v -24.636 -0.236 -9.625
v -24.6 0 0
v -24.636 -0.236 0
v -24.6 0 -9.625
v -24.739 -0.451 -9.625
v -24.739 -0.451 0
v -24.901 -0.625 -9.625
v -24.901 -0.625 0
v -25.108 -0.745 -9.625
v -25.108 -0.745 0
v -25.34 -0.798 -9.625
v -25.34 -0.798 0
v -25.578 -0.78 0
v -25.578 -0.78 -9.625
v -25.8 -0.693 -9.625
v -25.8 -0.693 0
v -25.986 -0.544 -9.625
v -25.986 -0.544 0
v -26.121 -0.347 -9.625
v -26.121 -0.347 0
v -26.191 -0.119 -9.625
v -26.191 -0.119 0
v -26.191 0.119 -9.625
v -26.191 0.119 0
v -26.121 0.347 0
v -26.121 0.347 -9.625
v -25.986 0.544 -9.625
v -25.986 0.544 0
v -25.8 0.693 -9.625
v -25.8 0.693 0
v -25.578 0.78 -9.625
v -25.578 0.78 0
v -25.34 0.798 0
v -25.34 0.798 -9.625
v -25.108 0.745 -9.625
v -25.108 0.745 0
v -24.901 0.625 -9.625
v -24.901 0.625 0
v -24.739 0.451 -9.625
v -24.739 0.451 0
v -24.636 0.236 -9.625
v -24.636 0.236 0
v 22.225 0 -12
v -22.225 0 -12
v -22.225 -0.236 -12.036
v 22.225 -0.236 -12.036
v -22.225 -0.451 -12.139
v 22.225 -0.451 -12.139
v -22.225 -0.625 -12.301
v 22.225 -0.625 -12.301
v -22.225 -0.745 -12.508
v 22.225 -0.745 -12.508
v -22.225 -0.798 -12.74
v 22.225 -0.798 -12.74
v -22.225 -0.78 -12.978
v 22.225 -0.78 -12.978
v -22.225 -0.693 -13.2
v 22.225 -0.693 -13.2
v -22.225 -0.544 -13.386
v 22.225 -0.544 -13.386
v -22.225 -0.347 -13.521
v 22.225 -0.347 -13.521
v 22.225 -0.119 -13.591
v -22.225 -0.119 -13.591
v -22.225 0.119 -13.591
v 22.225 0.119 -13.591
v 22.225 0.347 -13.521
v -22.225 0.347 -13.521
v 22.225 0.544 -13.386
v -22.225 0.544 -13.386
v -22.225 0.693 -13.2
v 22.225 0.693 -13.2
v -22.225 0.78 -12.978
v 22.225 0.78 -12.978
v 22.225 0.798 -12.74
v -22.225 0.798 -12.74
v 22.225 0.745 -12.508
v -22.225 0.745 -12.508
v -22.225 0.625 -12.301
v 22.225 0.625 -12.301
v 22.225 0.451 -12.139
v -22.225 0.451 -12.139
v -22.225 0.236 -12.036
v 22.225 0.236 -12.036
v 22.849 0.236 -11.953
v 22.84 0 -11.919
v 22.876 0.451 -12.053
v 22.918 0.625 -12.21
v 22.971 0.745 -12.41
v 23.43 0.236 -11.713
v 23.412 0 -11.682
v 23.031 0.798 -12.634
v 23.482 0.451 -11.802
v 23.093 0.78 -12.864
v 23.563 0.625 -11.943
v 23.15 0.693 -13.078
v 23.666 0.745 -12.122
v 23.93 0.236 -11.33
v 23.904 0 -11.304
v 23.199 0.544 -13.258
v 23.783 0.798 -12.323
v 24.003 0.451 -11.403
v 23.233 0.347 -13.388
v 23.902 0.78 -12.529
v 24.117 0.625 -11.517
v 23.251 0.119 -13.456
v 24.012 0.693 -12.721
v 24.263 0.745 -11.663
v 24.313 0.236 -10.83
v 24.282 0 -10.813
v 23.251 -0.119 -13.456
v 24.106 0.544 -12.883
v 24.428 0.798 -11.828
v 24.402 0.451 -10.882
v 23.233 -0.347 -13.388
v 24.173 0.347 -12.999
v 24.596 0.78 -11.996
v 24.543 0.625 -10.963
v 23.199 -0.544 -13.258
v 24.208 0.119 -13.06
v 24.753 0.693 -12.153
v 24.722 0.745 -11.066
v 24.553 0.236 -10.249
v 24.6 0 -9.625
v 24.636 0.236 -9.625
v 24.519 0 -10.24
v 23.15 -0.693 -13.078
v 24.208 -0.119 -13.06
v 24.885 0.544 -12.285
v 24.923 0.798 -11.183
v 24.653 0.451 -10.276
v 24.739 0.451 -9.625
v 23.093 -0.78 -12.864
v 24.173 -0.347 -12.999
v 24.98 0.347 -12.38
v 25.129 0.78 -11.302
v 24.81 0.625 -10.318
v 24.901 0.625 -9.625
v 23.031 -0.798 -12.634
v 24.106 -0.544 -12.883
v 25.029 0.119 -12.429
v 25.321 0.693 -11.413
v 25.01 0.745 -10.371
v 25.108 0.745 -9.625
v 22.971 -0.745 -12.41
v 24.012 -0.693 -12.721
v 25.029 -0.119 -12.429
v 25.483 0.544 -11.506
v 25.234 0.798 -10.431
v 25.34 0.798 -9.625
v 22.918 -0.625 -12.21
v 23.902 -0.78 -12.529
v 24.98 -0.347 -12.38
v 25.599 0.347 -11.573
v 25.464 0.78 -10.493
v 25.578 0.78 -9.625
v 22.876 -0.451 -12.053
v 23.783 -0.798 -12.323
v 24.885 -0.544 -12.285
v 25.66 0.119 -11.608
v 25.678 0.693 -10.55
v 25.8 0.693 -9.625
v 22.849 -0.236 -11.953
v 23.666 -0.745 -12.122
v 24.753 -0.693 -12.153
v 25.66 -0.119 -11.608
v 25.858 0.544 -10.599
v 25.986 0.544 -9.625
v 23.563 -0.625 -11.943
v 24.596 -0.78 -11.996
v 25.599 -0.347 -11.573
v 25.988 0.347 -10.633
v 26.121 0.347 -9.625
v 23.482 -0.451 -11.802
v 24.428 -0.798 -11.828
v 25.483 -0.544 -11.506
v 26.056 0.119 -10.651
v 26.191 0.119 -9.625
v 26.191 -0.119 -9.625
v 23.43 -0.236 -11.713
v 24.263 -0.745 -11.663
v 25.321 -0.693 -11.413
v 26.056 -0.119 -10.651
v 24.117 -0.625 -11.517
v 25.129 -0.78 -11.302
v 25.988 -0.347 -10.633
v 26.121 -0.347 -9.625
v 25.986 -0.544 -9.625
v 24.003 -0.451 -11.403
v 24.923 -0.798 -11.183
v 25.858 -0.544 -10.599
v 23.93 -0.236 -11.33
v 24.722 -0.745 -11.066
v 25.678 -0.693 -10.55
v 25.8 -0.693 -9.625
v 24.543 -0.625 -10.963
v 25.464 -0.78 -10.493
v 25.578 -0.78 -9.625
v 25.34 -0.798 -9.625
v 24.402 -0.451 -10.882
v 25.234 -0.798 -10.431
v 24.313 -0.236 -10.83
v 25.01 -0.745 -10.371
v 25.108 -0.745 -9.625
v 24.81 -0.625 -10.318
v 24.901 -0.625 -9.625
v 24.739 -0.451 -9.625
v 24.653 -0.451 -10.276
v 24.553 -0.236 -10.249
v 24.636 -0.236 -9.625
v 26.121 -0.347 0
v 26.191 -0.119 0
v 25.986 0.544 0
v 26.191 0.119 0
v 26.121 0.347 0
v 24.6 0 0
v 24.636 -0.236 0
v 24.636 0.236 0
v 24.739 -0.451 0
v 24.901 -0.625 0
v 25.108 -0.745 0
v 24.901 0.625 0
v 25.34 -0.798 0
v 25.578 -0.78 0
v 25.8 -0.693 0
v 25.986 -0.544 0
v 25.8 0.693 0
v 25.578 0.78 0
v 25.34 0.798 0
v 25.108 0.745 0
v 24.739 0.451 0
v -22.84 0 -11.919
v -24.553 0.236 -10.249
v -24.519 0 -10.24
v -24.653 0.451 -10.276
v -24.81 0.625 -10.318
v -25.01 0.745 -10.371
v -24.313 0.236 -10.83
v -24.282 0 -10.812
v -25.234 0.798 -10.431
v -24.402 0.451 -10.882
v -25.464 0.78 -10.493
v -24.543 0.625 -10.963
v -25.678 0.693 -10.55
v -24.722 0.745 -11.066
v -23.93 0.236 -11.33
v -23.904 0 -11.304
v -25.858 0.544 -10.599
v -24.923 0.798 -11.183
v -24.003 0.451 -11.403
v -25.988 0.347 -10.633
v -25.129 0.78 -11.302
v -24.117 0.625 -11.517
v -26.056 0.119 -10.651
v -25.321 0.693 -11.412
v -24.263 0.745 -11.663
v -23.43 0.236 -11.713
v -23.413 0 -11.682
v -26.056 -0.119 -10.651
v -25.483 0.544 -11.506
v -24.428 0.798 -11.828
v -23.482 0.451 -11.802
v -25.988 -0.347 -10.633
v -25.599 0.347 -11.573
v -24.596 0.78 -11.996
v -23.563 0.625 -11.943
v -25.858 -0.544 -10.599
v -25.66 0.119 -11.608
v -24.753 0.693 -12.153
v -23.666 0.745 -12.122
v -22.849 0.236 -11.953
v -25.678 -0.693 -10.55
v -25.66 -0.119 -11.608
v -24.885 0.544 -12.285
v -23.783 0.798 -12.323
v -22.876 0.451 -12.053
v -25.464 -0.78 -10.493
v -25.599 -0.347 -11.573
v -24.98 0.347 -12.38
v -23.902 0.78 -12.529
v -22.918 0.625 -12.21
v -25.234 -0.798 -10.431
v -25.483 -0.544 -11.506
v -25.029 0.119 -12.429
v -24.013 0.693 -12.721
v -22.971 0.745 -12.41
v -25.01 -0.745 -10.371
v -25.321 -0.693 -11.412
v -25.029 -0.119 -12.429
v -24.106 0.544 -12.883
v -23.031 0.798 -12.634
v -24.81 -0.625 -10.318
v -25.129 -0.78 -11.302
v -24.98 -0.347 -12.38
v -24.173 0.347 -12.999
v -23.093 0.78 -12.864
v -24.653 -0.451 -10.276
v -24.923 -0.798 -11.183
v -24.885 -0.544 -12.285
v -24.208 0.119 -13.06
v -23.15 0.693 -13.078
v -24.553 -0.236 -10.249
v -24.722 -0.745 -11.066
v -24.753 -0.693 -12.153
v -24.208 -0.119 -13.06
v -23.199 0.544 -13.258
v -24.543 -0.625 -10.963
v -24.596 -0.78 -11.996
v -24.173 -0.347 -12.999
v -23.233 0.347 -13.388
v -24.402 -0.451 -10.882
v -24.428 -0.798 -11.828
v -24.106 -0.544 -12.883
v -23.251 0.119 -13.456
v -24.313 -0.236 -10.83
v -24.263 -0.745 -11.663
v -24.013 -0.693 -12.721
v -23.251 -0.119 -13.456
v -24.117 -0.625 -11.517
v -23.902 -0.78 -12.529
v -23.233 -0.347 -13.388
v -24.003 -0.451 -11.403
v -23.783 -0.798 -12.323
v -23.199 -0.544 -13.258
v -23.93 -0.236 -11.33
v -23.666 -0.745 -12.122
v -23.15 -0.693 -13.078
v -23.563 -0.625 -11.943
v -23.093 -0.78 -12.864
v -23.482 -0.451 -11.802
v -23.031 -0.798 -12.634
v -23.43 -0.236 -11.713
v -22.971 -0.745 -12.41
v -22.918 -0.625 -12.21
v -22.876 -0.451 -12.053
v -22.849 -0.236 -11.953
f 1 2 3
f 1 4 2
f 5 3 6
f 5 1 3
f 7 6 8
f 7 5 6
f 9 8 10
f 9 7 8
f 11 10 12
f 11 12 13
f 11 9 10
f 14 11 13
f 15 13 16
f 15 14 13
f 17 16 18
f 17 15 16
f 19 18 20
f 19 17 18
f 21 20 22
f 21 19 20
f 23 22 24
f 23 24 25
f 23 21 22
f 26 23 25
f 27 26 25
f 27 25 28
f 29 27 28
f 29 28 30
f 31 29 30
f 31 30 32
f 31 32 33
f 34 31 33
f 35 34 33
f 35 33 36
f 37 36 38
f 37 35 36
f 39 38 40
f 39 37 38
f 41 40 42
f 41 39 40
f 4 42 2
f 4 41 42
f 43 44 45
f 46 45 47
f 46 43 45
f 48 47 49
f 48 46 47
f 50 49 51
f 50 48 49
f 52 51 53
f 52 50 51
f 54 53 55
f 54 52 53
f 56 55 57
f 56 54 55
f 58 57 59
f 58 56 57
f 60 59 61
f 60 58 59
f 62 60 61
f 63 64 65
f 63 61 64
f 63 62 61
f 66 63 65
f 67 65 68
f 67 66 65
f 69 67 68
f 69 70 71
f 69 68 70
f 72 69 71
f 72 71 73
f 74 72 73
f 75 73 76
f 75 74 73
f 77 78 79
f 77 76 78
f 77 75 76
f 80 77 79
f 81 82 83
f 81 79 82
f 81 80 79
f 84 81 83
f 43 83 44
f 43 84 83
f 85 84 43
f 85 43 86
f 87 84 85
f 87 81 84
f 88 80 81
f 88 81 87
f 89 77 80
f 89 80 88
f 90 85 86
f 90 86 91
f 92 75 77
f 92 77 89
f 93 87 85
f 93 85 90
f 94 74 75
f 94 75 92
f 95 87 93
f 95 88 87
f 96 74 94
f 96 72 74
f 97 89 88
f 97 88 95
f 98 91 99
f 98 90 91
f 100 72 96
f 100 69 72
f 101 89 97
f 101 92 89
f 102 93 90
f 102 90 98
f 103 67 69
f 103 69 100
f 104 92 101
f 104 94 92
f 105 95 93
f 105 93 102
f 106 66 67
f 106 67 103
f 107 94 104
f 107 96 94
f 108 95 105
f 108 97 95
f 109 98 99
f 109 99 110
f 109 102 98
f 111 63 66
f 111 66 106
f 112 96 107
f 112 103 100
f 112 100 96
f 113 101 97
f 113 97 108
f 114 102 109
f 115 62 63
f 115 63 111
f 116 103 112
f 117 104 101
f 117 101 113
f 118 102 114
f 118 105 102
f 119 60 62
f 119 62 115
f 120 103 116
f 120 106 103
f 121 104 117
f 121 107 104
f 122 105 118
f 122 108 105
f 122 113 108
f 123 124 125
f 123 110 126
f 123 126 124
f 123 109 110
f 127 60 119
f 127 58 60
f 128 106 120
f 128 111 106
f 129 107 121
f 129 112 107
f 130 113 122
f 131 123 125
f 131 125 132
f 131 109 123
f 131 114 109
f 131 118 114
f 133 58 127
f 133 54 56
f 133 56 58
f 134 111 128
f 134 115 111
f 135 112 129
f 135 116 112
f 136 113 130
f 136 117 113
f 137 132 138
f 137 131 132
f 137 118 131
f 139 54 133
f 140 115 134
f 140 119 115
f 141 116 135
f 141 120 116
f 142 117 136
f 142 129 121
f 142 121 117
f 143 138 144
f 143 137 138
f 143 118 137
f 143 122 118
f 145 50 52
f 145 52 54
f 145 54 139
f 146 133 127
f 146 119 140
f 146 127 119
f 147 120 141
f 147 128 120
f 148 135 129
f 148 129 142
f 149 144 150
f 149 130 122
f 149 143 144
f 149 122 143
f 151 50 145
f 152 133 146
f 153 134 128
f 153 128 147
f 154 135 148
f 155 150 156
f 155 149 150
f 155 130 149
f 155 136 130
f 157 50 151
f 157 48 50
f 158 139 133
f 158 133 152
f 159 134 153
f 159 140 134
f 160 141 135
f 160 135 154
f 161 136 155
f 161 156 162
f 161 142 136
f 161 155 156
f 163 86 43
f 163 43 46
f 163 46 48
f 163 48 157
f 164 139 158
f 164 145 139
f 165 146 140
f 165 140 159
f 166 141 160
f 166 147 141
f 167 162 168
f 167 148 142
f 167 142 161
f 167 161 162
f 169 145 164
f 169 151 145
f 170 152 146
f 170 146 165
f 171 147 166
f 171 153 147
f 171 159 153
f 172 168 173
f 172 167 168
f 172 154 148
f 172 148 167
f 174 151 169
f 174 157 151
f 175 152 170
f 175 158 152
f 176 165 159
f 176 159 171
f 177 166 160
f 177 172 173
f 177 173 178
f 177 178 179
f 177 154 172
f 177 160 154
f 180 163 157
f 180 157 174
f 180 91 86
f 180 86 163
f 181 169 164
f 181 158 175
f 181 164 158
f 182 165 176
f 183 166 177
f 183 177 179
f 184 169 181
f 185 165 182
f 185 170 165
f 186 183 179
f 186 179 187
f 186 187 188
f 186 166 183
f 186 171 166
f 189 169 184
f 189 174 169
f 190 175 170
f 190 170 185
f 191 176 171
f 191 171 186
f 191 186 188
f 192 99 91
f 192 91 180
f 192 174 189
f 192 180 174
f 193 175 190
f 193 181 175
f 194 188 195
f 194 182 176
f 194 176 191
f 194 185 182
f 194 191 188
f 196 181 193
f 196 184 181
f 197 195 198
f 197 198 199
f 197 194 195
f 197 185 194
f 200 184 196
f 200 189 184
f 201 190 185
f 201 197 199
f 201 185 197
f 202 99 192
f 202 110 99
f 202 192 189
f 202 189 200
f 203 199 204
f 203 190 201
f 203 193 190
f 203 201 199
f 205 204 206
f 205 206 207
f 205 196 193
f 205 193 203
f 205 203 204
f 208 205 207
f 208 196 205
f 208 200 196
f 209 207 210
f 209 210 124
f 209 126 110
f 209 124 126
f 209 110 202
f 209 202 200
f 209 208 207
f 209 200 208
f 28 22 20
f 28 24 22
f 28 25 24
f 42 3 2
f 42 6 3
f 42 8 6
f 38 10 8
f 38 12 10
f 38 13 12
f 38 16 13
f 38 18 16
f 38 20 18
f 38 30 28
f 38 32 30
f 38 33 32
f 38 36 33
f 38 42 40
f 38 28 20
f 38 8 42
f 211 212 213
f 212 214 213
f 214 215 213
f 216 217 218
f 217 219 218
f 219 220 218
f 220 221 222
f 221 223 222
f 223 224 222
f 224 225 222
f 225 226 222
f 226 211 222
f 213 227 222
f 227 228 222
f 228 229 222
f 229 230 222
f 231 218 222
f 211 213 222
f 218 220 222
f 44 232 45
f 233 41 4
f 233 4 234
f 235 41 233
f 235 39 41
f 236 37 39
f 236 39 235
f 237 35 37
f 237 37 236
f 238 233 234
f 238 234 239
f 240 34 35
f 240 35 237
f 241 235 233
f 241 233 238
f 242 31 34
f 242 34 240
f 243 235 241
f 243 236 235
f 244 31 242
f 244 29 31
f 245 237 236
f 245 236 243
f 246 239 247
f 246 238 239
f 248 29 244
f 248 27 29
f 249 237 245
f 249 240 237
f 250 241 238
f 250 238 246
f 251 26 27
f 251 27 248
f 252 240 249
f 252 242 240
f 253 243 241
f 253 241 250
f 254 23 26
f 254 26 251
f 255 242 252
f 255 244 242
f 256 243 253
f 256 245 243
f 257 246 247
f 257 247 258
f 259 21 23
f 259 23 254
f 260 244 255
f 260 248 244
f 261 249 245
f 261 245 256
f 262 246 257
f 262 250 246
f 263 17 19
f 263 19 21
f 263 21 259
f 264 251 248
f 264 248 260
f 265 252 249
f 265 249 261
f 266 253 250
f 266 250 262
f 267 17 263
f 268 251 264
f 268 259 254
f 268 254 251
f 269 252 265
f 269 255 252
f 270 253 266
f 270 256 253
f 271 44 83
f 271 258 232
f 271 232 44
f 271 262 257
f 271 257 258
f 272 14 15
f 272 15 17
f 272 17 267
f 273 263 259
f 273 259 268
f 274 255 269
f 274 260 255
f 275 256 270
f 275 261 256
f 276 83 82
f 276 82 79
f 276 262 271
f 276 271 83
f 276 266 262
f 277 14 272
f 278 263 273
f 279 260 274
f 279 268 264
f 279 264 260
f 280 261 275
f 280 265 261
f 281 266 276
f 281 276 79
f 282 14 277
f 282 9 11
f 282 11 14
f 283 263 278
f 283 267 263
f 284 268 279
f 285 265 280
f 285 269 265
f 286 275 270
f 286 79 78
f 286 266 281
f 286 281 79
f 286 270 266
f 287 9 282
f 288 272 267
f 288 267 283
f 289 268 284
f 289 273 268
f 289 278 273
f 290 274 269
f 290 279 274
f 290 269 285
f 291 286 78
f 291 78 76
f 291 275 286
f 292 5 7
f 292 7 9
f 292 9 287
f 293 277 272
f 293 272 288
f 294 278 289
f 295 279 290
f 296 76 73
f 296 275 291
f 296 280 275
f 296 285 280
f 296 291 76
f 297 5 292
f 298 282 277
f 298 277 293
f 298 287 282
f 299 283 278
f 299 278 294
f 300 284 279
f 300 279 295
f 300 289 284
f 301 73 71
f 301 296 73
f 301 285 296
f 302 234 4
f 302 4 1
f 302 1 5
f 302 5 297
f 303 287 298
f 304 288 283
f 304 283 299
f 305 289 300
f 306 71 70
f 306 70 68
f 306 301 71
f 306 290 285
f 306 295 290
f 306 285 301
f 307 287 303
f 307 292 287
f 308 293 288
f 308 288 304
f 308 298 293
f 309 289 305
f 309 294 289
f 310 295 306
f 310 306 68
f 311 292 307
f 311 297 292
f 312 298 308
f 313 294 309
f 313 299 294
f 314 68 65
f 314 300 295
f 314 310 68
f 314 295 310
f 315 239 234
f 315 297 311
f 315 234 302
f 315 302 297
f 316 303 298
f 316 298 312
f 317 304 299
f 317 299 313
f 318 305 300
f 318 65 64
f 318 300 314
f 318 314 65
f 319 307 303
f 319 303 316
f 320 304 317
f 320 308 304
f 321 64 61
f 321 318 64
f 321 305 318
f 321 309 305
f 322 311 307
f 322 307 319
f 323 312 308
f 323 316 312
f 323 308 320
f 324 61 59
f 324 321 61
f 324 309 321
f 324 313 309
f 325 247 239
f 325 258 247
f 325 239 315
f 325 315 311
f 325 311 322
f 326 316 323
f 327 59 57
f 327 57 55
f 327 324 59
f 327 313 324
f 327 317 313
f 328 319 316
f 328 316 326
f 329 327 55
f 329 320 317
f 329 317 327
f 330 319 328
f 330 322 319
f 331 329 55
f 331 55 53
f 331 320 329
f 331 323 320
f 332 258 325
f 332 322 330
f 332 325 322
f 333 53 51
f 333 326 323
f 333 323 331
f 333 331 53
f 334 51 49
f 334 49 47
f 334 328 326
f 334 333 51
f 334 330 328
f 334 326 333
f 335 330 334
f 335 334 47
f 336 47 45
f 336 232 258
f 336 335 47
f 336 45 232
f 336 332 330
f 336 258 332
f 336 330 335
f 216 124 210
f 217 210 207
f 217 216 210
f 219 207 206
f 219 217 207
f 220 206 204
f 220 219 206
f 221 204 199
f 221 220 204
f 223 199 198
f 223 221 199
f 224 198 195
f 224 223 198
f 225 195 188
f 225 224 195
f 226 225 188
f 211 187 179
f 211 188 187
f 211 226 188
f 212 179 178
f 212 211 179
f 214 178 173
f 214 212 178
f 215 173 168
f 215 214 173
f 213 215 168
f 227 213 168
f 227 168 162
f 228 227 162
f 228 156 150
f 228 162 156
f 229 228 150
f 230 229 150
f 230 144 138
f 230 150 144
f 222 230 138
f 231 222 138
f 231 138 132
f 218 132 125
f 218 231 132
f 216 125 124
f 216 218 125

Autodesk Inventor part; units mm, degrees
ref_plane "XZ Plane" through (0, 0, 0) normal (0, 1, 0) x (-1, 0, 0)
ref_plane "XY Plane" through (0, 0, 0) normal (0, 0, 1) x (1, 0, 0)
sketch "スケッチ1" plane through (0, 0, 0) normal (0, 0, 1) x (1, 0, 0)
  circle A0 centre (-25.4, 0) radius 0.8
  point P0 (0, 0)
  dimension "d0" = 1.6
  dimension "d3" = 25.4
sketch "スケッチ2" plane through (0, 0, 0) normal (0, 1, 0) x (-1, 0, 0)
  line L0 (25.4, 0) -> (25.4, -9.625)
  line L1 (22.225, -12.8) -> (-22.225, -12.8)
  line L2 (-25.4, -9.625) -> (-25.4, 0)
  arc A0 (22.225, -12.8) -> (25.4, -9.625) centre (22.225, -9.625) ccw
  arc A1 (-25.4, -9.625) -> (-22.225, -12.8) centre (-22.225, -9.625) ccw
  point P0 (0, 0)
  point P1 (0, -12.8)
  dimension "d1" = 3.175
  dimension "d2" = 12.8
sweep "スイープ1" add profiles "スケッチ1" path "スケッチ2"
properties part number "stabbar_u5"
